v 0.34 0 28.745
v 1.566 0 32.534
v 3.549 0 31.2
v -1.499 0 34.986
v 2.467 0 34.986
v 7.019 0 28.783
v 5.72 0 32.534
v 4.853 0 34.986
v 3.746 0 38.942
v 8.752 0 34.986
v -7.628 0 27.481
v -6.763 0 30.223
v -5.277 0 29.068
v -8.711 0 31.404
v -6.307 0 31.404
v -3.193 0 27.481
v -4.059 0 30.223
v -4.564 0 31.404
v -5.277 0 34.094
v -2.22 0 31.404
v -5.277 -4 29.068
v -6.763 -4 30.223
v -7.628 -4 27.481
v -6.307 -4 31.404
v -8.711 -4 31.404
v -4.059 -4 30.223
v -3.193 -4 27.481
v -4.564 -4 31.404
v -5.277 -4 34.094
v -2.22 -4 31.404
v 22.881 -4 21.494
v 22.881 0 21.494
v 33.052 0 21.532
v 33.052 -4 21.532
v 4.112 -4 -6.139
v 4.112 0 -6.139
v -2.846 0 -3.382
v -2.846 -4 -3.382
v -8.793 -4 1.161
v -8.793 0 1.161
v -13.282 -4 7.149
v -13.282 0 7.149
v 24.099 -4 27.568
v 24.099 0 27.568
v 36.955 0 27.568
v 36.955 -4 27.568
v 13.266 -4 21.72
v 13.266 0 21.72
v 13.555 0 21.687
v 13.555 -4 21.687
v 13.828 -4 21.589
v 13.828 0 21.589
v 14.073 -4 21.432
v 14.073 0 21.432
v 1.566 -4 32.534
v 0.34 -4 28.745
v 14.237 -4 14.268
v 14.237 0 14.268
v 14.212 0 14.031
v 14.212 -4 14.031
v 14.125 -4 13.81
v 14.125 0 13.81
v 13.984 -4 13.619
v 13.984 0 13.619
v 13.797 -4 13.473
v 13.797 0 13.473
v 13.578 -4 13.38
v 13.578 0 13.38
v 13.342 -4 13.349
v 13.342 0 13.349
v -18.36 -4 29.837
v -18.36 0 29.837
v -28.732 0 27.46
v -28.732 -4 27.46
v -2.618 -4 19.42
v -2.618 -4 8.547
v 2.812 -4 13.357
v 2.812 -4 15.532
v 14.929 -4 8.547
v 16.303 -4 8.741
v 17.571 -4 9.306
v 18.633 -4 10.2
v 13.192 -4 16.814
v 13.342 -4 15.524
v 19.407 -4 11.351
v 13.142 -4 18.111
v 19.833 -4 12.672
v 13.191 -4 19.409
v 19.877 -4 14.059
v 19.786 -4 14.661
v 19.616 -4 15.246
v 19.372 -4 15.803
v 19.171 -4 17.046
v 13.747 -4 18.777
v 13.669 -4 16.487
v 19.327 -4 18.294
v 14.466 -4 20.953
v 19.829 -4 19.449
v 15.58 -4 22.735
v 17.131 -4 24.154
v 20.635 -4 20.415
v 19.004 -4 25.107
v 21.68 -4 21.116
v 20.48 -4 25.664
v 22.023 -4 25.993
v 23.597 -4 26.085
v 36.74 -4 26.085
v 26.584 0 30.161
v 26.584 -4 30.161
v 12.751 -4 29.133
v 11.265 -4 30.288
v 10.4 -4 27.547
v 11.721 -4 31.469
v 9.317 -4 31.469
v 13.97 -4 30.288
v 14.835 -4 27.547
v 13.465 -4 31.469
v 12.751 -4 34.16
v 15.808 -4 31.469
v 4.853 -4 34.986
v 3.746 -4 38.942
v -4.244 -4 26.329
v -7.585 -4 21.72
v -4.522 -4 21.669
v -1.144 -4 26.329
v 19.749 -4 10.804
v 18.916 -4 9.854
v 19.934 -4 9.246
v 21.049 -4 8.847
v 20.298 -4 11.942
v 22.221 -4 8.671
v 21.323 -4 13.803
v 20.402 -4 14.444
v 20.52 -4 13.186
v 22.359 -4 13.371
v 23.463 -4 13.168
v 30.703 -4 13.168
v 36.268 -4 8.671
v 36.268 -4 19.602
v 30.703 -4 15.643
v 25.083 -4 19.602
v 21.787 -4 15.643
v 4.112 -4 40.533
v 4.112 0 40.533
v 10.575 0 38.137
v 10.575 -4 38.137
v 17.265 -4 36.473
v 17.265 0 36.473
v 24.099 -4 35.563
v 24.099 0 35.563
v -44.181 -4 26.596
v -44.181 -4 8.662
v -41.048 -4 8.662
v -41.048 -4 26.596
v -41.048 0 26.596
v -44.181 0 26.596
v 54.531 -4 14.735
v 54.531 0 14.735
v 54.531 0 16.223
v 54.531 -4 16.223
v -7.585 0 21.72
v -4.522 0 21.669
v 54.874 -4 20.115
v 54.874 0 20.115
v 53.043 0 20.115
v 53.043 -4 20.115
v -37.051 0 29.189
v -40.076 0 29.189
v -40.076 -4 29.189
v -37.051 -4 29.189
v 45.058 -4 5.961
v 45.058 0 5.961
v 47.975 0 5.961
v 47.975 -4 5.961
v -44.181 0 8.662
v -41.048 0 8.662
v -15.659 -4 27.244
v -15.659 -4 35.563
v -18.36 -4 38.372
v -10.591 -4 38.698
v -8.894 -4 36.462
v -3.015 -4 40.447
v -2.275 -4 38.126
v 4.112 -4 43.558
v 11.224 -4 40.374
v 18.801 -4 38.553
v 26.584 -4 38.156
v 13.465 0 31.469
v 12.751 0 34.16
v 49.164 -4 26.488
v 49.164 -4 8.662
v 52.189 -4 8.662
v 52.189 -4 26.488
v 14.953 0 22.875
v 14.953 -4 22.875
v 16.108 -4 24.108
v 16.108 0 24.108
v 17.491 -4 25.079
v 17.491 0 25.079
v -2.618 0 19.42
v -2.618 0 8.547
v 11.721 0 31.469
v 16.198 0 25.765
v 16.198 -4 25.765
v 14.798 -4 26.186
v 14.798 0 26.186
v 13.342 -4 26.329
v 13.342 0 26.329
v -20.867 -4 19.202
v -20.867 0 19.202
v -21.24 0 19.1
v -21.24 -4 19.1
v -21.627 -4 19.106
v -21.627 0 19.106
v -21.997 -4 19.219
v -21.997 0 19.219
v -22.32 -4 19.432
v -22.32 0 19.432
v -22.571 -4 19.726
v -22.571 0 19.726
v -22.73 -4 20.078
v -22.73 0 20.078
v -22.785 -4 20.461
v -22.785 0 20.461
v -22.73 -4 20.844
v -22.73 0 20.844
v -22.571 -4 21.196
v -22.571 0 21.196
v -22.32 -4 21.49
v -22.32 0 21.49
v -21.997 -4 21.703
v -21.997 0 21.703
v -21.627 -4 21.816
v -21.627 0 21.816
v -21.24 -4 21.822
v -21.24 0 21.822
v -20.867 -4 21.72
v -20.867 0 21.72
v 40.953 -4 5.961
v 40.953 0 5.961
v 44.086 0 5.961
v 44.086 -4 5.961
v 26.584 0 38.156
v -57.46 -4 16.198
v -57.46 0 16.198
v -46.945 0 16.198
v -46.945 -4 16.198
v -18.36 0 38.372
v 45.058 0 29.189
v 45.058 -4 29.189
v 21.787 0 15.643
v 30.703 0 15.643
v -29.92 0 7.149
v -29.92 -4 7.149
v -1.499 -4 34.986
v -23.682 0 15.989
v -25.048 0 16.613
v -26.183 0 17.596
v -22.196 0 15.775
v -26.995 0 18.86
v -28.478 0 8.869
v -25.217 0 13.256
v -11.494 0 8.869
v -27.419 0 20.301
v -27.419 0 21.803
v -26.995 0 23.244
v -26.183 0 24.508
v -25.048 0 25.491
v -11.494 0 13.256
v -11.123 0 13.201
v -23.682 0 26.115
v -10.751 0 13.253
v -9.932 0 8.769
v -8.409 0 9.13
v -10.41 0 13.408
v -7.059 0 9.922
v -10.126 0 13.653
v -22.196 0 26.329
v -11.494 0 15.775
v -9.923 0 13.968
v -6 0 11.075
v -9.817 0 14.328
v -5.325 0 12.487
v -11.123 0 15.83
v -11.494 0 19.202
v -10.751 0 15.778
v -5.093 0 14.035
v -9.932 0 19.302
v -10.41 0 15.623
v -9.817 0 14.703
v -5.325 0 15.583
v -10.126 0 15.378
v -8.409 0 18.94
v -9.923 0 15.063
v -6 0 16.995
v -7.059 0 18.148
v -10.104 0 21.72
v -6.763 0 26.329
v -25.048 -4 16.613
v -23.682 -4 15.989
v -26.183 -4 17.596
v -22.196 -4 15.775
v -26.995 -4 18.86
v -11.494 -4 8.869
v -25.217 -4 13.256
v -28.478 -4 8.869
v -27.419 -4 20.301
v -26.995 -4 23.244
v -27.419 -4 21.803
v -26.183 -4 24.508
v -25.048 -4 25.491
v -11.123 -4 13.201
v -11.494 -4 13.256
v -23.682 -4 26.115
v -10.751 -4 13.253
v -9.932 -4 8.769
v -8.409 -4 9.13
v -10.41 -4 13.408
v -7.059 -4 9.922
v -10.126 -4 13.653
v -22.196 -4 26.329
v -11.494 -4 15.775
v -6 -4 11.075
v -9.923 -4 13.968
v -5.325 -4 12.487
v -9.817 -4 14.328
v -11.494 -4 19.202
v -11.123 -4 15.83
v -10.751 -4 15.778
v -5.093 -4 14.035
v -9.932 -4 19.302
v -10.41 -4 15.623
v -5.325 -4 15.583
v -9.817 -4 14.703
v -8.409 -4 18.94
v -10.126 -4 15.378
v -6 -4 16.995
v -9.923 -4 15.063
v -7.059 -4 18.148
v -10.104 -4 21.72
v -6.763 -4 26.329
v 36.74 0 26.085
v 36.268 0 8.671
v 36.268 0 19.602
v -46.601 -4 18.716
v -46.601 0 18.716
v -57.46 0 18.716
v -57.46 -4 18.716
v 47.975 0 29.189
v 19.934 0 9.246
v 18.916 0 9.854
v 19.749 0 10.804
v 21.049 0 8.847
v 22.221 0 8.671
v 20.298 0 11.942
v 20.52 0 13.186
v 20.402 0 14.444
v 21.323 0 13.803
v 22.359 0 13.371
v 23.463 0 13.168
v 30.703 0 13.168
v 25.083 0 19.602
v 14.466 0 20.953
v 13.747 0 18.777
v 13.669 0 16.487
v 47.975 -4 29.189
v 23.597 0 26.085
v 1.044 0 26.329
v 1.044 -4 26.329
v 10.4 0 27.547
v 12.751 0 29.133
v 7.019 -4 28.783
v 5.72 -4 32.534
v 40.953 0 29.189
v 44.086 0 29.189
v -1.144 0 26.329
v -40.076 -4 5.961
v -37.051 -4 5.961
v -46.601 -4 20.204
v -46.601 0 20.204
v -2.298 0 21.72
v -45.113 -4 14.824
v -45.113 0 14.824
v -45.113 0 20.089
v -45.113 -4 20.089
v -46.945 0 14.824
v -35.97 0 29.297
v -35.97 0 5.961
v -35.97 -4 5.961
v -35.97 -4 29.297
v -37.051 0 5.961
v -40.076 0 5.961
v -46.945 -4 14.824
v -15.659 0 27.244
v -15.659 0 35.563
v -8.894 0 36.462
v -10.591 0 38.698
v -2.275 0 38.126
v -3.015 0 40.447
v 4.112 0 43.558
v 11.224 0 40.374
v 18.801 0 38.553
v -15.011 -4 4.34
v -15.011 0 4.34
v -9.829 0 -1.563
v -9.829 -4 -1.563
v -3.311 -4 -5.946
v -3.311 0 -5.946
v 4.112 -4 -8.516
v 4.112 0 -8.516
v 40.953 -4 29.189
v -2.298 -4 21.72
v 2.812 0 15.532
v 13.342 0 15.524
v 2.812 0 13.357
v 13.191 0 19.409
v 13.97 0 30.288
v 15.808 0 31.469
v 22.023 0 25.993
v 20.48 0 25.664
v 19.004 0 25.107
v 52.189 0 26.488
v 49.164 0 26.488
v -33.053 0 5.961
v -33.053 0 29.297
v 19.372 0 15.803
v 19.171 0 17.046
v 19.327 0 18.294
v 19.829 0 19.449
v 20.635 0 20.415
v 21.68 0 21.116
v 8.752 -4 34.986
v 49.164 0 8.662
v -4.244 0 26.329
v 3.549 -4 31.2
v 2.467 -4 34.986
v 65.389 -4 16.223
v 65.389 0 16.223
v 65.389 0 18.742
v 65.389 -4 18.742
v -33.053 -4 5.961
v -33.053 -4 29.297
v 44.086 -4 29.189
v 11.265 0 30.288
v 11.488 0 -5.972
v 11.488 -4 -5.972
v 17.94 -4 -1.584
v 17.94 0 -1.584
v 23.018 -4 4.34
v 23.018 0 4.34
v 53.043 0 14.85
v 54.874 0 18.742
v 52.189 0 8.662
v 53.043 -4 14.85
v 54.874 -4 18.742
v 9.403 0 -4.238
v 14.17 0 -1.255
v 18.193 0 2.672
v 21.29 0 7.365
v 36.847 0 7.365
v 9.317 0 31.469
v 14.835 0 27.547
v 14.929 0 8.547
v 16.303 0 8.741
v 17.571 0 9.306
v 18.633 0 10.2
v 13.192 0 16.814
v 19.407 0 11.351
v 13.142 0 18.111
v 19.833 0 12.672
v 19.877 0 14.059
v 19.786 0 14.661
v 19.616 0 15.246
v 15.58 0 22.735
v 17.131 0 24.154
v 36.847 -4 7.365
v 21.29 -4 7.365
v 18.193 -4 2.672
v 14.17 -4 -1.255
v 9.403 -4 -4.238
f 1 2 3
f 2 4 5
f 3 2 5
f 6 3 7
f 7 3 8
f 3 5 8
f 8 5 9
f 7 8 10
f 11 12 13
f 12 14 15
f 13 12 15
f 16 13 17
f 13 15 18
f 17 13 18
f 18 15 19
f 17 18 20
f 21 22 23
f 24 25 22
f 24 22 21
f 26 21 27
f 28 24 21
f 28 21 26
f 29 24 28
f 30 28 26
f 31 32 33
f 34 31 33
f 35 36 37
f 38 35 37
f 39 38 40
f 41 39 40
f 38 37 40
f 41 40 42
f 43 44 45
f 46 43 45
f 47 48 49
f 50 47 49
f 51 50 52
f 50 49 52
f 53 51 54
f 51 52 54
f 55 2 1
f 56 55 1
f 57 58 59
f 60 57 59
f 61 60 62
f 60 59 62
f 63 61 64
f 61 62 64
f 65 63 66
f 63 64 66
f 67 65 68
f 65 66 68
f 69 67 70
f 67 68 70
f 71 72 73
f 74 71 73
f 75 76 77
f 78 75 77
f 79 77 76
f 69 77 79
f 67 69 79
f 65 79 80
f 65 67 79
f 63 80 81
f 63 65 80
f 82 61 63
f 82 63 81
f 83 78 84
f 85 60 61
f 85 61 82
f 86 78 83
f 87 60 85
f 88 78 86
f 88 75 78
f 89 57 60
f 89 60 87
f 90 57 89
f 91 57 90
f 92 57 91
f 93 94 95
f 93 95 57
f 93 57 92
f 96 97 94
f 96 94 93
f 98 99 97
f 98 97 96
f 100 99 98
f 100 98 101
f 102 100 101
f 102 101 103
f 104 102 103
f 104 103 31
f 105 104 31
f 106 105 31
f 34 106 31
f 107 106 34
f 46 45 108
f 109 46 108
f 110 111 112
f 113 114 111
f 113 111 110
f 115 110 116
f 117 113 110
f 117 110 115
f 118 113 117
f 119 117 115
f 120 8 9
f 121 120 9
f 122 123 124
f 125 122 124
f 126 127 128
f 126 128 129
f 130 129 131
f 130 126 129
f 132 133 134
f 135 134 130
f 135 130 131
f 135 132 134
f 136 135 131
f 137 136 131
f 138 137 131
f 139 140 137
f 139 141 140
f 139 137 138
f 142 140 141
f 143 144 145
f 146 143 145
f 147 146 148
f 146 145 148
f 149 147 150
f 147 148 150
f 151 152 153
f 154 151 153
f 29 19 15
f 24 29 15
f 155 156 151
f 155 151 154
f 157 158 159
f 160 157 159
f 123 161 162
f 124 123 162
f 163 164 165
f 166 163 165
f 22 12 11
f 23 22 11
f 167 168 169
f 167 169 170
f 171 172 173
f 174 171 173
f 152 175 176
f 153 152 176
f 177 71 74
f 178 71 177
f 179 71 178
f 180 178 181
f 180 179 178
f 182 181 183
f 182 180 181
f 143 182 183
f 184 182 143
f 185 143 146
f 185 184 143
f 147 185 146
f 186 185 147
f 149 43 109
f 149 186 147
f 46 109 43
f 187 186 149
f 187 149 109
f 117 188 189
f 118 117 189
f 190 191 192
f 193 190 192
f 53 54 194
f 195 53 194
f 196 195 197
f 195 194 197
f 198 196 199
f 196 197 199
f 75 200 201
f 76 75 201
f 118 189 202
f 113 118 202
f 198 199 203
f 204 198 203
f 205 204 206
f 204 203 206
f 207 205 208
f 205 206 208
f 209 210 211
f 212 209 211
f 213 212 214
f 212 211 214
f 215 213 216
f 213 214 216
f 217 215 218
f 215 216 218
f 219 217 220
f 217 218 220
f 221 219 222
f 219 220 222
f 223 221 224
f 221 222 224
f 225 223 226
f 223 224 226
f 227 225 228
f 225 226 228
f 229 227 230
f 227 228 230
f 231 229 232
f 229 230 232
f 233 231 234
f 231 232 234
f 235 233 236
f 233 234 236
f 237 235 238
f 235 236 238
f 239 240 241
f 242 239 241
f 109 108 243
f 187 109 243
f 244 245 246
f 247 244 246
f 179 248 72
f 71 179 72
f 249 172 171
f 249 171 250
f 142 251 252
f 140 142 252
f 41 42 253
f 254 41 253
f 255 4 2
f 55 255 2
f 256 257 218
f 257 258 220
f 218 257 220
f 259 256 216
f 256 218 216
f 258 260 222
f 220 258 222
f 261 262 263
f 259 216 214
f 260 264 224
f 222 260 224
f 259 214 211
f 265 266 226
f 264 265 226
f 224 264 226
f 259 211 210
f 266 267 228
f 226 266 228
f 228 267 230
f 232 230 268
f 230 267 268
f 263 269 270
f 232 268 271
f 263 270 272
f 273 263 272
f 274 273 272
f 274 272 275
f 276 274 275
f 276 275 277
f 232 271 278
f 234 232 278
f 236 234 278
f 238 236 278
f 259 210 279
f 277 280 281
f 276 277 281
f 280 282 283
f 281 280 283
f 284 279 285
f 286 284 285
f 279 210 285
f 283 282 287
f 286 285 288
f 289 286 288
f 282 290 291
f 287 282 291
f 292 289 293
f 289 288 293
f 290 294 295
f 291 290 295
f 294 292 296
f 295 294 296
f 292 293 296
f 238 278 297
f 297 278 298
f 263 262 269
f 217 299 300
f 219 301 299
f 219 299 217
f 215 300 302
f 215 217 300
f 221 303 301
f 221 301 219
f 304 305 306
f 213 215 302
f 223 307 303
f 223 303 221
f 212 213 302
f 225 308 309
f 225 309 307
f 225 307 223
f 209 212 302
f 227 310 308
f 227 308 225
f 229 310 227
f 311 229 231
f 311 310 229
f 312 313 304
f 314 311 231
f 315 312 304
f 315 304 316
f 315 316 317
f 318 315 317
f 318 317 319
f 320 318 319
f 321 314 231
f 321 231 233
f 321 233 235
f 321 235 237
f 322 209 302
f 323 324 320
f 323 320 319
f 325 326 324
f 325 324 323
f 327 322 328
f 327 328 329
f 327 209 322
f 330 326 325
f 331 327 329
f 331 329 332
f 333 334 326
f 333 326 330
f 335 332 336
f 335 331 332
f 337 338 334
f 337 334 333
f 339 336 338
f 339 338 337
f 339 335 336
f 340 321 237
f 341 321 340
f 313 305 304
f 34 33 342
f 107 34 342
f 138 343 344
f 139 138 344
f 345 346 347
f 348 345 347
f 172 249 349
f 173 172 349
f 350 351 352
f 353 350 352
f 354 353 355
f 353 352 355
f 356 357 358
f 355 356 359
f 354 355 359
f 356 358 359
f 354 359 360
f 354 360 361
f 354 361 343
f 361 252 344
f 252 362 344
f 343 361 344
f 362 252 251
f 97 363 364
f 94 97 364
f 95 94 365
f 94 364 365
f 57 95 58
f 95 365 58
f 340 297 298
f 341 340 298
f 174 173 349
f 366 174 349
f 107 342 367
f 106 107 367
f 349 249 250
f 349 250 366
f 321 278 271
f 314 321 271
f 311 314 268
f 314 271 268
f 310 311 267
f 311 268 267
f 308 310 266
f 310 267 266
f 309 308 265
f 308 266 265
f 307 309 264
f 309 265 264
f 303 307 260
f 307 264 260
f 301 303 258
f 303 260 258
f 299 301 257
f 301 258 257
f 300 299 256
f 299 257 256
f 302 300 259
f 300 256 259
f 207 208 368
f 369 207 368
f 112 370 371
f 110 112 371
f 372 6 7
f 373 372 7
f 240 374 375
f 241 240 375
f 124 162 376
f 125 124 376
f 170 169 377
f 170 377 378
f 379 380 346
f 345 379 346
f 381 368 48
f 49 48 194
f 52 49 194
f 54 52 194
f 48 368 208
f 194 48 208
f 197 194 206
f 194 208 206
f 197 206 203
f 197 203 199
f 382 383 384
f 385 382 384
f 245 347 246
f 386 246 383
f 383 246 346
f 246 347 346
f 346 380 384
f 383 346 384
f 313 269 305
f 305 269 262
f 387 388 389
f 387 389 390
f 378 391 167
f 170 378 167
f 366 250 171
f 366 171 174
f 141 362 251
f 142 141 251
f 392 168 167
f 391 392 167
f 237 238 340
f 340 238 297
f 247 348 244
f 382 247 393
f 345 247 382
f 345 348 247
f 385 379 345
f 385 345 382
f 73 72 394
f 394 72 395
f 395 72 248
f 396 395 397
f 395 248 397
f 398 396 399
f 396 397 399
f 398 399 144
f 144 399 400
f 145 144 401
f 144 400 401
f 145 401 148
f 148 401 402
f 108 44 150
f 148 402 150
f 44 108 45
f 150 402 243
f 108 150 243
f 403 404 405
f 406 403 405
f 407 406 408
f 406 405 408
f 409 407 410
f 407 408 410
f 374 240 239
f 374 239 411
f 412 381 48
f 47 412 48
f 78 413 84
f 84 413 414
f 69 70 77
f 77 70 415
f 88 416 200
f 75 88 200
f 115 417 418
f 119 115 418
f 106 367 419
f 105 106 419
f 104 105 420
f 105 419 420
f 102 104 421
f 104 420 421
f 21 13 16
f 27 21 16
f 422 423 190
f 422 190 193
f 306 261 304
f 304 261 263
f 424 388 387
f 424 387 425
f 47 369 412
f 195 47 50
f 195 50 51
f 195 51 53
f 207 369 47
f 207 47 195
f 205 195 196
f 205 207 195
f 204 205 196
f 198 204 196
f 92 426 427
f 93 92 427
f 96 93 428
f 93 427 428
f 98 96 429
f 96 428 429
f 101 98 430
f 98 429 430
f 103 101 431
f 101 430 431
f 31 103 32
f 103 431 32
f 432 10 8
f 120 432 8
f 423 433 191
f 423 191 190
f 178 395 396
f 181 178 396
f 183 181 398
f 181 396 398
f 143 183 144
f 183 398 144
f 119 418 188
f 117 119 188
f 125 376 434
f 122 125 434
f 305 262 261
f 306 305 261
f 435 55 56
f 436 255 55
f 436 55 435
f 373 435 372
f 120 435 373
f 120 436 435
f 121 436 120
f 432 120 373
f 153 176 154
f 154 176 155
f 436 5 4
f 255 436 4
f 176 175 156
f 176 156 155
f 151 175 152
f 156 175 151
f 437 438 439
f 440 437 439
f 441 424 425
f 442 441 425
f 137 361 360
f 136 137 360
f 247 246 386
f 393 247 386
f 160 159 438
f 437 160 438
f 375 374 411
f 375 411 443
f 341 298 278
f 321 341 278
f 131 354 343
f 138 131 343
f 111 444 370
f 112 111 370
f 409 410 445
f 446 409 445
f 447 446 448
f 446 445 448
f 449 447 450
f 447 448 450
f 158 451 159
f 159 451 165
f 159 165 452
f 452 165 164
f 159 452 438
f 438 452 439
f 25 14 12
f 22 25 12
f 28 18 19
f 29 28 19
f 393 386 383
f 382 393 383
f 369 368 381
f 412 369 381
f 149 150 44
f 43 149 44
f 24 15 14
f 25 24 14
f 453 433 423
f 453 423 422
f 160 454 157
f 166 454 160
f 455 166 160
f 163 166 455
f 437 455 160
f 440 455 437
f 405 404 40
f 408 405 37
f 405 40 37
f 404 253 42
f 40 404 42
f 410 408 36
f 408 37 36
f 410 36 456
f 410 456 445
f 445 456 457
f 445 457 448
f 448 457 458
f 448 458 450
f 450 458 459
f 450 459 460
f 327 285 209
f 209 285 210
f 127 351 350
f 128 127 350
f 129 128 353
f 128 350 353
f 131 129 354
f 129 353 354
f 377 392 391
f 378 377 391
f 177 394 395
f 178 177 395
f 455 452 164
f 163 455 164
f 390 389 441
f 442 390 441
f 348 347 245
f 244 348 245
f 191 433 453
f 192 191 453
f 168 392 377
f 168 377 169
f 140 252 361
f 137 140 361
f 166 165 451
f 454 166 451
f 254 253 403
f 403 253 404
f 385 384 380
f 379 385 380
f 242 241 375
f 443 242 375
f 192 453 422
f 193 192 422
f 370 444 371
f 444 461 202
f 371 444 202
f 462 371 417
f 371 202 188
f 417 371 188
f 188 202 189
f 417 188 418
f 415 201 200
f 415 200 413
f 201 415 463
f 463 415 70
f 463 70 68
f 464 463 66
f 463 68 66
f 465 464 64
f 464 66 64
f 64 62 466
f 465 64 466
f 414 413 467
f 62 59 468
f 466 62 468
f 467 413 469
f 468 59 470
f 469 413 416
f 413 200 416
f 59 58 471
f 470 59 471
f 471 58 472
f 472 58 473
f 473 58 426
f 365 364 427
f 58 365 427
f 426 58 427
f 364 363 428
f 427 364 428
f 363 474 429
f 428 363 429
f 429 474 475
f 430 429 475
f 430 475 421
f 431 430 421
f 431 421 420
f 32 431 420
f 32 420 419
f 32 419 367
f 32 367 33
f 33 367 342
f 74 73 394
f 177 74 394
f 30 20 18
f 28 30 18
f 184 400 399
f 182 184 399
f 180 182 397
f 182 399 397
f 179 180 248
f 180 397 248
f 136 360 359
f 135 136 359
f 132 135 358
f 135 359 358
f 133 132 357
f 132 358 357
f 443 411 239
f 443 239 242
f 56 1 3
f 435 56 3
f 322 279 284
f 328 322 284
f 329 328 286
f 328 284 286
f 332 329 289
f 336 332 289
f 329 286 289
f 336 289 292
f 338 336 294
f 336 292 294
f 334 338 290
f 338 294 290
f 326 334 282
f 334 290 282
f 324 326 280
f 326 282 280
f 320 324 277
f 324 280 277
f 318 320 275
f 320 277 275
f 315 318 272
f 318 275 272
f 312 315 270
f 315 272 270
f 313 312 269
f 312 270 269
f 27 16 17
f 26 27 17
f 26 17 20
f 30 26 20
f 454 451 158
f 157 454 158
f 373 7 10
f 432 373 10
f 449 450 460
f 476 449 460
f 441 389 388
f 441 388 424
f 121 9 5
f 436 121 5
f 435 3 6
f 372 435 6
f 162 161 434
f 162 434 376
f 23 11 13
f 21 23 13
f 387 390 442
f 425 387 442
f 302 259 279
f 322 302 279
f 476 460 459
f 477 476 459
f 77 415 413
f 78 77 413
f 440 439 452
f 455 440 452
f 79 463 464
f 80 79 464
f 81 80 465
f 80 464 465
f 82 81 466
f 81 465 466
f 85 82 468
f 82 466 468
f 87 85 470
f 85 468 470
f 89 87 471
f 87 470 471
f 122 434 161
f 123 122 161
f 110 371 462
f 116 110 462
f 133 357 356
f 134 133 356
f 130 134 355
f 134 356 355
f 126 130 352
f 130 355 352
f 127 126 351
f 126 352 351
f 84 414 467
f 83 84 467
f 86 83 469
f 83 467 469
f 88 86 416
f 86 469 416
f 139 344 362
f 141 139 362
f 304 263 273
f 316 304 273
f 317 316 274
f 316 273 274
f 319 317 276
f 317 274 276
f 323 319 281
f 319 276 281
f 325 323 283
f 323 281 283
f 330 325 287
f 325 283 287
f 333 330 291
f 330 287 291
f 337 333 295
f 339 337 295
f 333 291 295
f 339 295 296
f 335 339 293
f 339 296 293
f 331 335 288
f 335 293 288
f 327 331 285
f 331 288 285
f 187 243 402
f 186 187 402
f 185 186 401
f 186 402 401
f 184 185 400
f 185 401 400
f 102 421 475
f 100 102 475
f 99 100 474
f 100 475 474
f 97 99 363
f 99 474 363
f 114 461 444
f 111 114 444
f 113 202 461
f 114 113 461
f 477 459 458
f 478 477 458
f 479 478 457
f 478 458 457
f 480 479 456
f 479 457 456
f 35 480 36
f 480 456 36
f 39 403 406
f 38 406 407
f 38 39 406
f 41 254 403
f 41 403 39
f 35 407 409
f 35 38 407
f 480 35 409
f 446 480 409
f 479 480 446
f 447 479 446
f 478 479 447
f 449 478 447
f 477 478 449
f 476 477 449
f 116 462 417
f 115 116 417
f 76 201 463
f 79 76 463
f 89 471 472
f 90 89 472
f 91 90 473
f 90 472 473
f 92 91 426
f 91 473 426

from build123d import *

# Parameters (mm, degrees)
F0_W     = 2.917025
F0_H     = 23.336196
F0_W_2   = 3.025058
F0_H_2   = 23.228157
F0_W_3   = 3.133103
F0_H_3   = 17.934299
F0_W_4   = 3.1331
F0_W_5   = 2.917021
F0_W_6   = 3.025062
F0_H_4   = 17.826262
F1_DEPTH = 4


with BuildPart() as f1:
    # F0 (on Front) → F1 (new body)
    with BuildSketch(Plane.XZ):
        with BuildLine():
            Line((-18.360175, 29.837262), (-28.731817, 27.460426))
            Line((-28.731817, 27.460426), (-15.659228, 27.24435))
            Line((-15.659228, 27.24435), (-15.659228, 35.563271))
            ThreePointArc((-15.659228, 35.563271), (-5.560472, 37.199644), (4.111716, 40.533017))
            ThreePointArc((4.111716, 40.533017), (13.897301, 37.211928), (24.098735, 35.563271))
            Line((24.098735, 35.563271), (24.098735, 27.568465))
            Line((24.098735, 27.568465), (36.955252, 27.568465))
            Line((36.955252, 27.568465), (26.583608, 30.161375))
            Line((26.583608, 30.161375), (26.583608, 38.156182))
            ThreePointArc((26.583608, 38.156182), (14.970461, 39.287974), (4.111716, 43.55808))
            ThreePointArc((4.111716, 43.55808), (-6.762464, 39.397518), (-18.360175, 38.37226))
            Line((-18.360175, 38.37226), (-18.360175, 29.837262))
        make_face()
        with BuildLine():
            Line((-13.282392, 7.149293), (-29.920235, 7.149293))
            Line((-29.920235, 7.149293), (-15.011, 4.340306))
            ThreePointArc((-15.011, 4.340306), (-6.711737, -3.965185), (4.111716, -8.516208))
            ThreePointArc((4.111716, -8.516208), (14.859618, -3.991748), (23.018356, 4.340306))
            Line((23.018356, 4.340306), (36.847211, 7.365369))
            Line((36.847211, 7.365369), (21.289749, 7.365369))
            ThreePointArc((21.289749, 7.365369), (14.169619, -1.255427), (4.111716, -6.139375))
            ThreePointArc((4.111716, -6.139375), (-5.975783, -1.315054), (-13.282392, 7.149293))
        make_face()
        with Locations((-34.511848, 17.628974)):
            Rectangle(F0_W, F0_H)
        with Locations((-38.563272, 17.574955)):
            Rectangle(F0_W_2, F0_H_2)
        with Locations((-42.614694, 17.628974)):
            Rectangle(F0_W_3, F0_H_3)
        with Locations((42.519206, 17.574955)):
            Rectangle(F0_W_4, F0_H_2)
        with Locations((46.516609, 17.574955)):
            Rectangle(F0_W_5, F0_H_2)
        with Locations((50.67607, 17.574955)):
            Rectangle(F0_W_6, F0_H_4)
        Polygon((-45.113314, 14.824063), (-45.113314, 20.089325), (-46.601322, 20.203786), (-46.601322, 18.715777), (-57.460032, 18.715777), (-57.460032, 16.197609), (-46.944711, 16.197609), (-46.944711, 14.824063), align=None)
        Polygon((53.042778, 20.115187), (53.042778, 14.849925), (54.530785, 14.735464), (54.530785, 16.223473), (65.389496, 16.223473), (65.389496, 18.741641), (54.874175, 18.741641), (54.874175, 20.115187), align=None)
        Polygon((-6.307463, 31.403811), (-8.711336, 31.403811), (-6.762973, 30.222766), (-7.628314, 27.481353), (-5.277231, 29.067773), (-3.193445, 27.481353), (-4.058785, 30.222766), (-2.219936, 31.403811), (-4.563566, 31.403811), (-5.277231, 34.093976), align=None)
        Polygon((0.340029, 28.745491), (3.549, 31.200001), (7.019212, 28.782552), (5.719735, 32.533981), (8.75185, 34.985866), (4.853417, 34.985866), (3.746455, 38.942028), (2.467324, 34.985866), (-1.498819, 34.985866), (1.565928, 32.533981), align=None)
        Polygon((11.720847, 31.469355), (9.316974, 31.469355), (11.265337, 30.288311), (10.399996, 27.546898), (12.75108, 29.133318), (14.834866, 27.546898), (13.969526, 30.288311), (15.808374, 31.469355), (13.464744, 31.469355), (12.75108, 34.159521), align=None)
        with BuildLine():
            Line((-10.104408, 21.720048), (-6.762973, 26.328867))
            Line((-6.762973, 26.328867), (-22.195523, 26.328867))
            ThreePointArc((-22.195523, 26.328867), (-27.472356, 21.052034), (-22.195523, 15.7752))
            Line((-22.195523, 15.7752), (-11.494022, 15.7752))
            ThreePointArc((-11.494022, 15.7752), (-9.803198, 14.515352), (-11.494022, 13.255504))
            Line((-11.494022, 13.255504), (-25.216663, 13.255504))
            Line((-25.216663, 13.255504), (-28.477632, 8.868717))
            Line((-28.477632, 8.868717), (-11.494022, 8.868717))
            ThreePointArc((-11.494022, 8.868717), (-5.093214, 14.035207), (-11.494022, 19.201698))
            Line((-11.494022, 19.201698), (-20.867361, 19.201698))
            ThreePointArc((-20.867361, 19.201698), (-22.784725, 20.460873), (-20.867361, 21.720048))
            Line((-20.867361, 21.720048), (-10.104408, 21.720048))
        make_face()
        Polygon((-1.143724, 26.328867), (-4.24384, 26.328867), (-7.585275, 21.720048), (-4.52187, 21.669413), align=None)
        with BuildLine():
            Line((13.34219, 26.328867), (1.043928, 26.328867))
            Line((1.043928, 26.328867), (-2.297507, 21.720048))
            Line((-2.297507, 21.720048), (13.266011, 21.720048))
            ThreePointArc((13.266011, 21.720048), (13.694347, 21.646), (14.072965, 21.432452))
            ThreePointArc((14.072965, 21.432452), (15.499101, 23.520872), (17.490635, 25.079448))
            ThreePointArc((17.490635, 25.079448), (15.508445, 26.009733), (13.34219, 26.328867))
        make_face()
        with BuildLine():
            ThreePointArc((13.34219, 15.524202), (13.154137, 17.462209), (13.191477, 19.40896))
            Line((13.191477, 19.40896), (-2.617514, 19.420345))
            Line((-2.617514, 19.420345), (-2.617514, 8.547293))
            Line((-2.617514, 8.547293), (14.928817, 8.547293))
            ThreePointArc((14.928817, 8.547293), (18.632648, 10.199588), (19.877462, 14.059496))
            ThreePointArc((19.877462, 14.059496), (19.710661, 14.956158), (19.37234, 15.803132))
            ThreePointArc((19.37234, 15.803132), (19.828735, 19.448747), (22.880699, 21.494308))
            Line((22.880699, 21.494308), (33.052407, 21.532437))
            Line((33.052407, 21.532437), (36.740046, 26.085043))
            Line((36.740046, 26.085043), (23.597317, 26.085043))
            ThreePointArc((23.597317, 26.085043), (21.245002, 25.857594), (19.004105, 25.106926))
            ThreePointArc((19.004105, 25.106926), (16.307164, 23.497174), (14.465537, 20.952925))
            ThreePointArc((14.465537, 20.952925), (13.626173, 17.635021), (14.236932, 14.267531))
            ThreePointArc((14.236932, 14.267531), (13.983505, 13.619365), (13.34219, 13.349068))
            Line((13.34219, 13.349068), (2.812496, 13.356651))
            Line((2.812496, 13.356651), (2.812496, 15.531785))
            Line((2.812496, 15.531785), (13.34219, 15.524202))
        make_face()
        with BuildLine():
            ThreePointArc((20.401722, 14.443579), (20.297513, 11.942299), (18.916195, 9.854423))
            ThreePointArc((18.916195, 9.854423), (20.481661, 9.019415), (22.221338, 8.670922))
            Line((22.221338, 8.670922), (36.26788, 8.670922))
            Line((36.26788, 8.670922), (36.26788, 19.601882))
            Line((36.26788, 19.601882), (25.08281, 19.601882))
            Line((25.08281, 19.601882), (21.787236, 15.642961))
            Line((21.787236, 15.642961), (30.703217, 15.642961))
            Line((30.703217, 15.642961), (30.703217, 13.16824))
            Line((30.703217, 13.16824), (23.462653, 13.16824))
            ThreePointArc((23.462653, 13.16824), (21.829472, 13.559382), (20.401722, 14.443579))
        make_face()
    extrude(amount=F1_DEPTH)


solid = f1.part
